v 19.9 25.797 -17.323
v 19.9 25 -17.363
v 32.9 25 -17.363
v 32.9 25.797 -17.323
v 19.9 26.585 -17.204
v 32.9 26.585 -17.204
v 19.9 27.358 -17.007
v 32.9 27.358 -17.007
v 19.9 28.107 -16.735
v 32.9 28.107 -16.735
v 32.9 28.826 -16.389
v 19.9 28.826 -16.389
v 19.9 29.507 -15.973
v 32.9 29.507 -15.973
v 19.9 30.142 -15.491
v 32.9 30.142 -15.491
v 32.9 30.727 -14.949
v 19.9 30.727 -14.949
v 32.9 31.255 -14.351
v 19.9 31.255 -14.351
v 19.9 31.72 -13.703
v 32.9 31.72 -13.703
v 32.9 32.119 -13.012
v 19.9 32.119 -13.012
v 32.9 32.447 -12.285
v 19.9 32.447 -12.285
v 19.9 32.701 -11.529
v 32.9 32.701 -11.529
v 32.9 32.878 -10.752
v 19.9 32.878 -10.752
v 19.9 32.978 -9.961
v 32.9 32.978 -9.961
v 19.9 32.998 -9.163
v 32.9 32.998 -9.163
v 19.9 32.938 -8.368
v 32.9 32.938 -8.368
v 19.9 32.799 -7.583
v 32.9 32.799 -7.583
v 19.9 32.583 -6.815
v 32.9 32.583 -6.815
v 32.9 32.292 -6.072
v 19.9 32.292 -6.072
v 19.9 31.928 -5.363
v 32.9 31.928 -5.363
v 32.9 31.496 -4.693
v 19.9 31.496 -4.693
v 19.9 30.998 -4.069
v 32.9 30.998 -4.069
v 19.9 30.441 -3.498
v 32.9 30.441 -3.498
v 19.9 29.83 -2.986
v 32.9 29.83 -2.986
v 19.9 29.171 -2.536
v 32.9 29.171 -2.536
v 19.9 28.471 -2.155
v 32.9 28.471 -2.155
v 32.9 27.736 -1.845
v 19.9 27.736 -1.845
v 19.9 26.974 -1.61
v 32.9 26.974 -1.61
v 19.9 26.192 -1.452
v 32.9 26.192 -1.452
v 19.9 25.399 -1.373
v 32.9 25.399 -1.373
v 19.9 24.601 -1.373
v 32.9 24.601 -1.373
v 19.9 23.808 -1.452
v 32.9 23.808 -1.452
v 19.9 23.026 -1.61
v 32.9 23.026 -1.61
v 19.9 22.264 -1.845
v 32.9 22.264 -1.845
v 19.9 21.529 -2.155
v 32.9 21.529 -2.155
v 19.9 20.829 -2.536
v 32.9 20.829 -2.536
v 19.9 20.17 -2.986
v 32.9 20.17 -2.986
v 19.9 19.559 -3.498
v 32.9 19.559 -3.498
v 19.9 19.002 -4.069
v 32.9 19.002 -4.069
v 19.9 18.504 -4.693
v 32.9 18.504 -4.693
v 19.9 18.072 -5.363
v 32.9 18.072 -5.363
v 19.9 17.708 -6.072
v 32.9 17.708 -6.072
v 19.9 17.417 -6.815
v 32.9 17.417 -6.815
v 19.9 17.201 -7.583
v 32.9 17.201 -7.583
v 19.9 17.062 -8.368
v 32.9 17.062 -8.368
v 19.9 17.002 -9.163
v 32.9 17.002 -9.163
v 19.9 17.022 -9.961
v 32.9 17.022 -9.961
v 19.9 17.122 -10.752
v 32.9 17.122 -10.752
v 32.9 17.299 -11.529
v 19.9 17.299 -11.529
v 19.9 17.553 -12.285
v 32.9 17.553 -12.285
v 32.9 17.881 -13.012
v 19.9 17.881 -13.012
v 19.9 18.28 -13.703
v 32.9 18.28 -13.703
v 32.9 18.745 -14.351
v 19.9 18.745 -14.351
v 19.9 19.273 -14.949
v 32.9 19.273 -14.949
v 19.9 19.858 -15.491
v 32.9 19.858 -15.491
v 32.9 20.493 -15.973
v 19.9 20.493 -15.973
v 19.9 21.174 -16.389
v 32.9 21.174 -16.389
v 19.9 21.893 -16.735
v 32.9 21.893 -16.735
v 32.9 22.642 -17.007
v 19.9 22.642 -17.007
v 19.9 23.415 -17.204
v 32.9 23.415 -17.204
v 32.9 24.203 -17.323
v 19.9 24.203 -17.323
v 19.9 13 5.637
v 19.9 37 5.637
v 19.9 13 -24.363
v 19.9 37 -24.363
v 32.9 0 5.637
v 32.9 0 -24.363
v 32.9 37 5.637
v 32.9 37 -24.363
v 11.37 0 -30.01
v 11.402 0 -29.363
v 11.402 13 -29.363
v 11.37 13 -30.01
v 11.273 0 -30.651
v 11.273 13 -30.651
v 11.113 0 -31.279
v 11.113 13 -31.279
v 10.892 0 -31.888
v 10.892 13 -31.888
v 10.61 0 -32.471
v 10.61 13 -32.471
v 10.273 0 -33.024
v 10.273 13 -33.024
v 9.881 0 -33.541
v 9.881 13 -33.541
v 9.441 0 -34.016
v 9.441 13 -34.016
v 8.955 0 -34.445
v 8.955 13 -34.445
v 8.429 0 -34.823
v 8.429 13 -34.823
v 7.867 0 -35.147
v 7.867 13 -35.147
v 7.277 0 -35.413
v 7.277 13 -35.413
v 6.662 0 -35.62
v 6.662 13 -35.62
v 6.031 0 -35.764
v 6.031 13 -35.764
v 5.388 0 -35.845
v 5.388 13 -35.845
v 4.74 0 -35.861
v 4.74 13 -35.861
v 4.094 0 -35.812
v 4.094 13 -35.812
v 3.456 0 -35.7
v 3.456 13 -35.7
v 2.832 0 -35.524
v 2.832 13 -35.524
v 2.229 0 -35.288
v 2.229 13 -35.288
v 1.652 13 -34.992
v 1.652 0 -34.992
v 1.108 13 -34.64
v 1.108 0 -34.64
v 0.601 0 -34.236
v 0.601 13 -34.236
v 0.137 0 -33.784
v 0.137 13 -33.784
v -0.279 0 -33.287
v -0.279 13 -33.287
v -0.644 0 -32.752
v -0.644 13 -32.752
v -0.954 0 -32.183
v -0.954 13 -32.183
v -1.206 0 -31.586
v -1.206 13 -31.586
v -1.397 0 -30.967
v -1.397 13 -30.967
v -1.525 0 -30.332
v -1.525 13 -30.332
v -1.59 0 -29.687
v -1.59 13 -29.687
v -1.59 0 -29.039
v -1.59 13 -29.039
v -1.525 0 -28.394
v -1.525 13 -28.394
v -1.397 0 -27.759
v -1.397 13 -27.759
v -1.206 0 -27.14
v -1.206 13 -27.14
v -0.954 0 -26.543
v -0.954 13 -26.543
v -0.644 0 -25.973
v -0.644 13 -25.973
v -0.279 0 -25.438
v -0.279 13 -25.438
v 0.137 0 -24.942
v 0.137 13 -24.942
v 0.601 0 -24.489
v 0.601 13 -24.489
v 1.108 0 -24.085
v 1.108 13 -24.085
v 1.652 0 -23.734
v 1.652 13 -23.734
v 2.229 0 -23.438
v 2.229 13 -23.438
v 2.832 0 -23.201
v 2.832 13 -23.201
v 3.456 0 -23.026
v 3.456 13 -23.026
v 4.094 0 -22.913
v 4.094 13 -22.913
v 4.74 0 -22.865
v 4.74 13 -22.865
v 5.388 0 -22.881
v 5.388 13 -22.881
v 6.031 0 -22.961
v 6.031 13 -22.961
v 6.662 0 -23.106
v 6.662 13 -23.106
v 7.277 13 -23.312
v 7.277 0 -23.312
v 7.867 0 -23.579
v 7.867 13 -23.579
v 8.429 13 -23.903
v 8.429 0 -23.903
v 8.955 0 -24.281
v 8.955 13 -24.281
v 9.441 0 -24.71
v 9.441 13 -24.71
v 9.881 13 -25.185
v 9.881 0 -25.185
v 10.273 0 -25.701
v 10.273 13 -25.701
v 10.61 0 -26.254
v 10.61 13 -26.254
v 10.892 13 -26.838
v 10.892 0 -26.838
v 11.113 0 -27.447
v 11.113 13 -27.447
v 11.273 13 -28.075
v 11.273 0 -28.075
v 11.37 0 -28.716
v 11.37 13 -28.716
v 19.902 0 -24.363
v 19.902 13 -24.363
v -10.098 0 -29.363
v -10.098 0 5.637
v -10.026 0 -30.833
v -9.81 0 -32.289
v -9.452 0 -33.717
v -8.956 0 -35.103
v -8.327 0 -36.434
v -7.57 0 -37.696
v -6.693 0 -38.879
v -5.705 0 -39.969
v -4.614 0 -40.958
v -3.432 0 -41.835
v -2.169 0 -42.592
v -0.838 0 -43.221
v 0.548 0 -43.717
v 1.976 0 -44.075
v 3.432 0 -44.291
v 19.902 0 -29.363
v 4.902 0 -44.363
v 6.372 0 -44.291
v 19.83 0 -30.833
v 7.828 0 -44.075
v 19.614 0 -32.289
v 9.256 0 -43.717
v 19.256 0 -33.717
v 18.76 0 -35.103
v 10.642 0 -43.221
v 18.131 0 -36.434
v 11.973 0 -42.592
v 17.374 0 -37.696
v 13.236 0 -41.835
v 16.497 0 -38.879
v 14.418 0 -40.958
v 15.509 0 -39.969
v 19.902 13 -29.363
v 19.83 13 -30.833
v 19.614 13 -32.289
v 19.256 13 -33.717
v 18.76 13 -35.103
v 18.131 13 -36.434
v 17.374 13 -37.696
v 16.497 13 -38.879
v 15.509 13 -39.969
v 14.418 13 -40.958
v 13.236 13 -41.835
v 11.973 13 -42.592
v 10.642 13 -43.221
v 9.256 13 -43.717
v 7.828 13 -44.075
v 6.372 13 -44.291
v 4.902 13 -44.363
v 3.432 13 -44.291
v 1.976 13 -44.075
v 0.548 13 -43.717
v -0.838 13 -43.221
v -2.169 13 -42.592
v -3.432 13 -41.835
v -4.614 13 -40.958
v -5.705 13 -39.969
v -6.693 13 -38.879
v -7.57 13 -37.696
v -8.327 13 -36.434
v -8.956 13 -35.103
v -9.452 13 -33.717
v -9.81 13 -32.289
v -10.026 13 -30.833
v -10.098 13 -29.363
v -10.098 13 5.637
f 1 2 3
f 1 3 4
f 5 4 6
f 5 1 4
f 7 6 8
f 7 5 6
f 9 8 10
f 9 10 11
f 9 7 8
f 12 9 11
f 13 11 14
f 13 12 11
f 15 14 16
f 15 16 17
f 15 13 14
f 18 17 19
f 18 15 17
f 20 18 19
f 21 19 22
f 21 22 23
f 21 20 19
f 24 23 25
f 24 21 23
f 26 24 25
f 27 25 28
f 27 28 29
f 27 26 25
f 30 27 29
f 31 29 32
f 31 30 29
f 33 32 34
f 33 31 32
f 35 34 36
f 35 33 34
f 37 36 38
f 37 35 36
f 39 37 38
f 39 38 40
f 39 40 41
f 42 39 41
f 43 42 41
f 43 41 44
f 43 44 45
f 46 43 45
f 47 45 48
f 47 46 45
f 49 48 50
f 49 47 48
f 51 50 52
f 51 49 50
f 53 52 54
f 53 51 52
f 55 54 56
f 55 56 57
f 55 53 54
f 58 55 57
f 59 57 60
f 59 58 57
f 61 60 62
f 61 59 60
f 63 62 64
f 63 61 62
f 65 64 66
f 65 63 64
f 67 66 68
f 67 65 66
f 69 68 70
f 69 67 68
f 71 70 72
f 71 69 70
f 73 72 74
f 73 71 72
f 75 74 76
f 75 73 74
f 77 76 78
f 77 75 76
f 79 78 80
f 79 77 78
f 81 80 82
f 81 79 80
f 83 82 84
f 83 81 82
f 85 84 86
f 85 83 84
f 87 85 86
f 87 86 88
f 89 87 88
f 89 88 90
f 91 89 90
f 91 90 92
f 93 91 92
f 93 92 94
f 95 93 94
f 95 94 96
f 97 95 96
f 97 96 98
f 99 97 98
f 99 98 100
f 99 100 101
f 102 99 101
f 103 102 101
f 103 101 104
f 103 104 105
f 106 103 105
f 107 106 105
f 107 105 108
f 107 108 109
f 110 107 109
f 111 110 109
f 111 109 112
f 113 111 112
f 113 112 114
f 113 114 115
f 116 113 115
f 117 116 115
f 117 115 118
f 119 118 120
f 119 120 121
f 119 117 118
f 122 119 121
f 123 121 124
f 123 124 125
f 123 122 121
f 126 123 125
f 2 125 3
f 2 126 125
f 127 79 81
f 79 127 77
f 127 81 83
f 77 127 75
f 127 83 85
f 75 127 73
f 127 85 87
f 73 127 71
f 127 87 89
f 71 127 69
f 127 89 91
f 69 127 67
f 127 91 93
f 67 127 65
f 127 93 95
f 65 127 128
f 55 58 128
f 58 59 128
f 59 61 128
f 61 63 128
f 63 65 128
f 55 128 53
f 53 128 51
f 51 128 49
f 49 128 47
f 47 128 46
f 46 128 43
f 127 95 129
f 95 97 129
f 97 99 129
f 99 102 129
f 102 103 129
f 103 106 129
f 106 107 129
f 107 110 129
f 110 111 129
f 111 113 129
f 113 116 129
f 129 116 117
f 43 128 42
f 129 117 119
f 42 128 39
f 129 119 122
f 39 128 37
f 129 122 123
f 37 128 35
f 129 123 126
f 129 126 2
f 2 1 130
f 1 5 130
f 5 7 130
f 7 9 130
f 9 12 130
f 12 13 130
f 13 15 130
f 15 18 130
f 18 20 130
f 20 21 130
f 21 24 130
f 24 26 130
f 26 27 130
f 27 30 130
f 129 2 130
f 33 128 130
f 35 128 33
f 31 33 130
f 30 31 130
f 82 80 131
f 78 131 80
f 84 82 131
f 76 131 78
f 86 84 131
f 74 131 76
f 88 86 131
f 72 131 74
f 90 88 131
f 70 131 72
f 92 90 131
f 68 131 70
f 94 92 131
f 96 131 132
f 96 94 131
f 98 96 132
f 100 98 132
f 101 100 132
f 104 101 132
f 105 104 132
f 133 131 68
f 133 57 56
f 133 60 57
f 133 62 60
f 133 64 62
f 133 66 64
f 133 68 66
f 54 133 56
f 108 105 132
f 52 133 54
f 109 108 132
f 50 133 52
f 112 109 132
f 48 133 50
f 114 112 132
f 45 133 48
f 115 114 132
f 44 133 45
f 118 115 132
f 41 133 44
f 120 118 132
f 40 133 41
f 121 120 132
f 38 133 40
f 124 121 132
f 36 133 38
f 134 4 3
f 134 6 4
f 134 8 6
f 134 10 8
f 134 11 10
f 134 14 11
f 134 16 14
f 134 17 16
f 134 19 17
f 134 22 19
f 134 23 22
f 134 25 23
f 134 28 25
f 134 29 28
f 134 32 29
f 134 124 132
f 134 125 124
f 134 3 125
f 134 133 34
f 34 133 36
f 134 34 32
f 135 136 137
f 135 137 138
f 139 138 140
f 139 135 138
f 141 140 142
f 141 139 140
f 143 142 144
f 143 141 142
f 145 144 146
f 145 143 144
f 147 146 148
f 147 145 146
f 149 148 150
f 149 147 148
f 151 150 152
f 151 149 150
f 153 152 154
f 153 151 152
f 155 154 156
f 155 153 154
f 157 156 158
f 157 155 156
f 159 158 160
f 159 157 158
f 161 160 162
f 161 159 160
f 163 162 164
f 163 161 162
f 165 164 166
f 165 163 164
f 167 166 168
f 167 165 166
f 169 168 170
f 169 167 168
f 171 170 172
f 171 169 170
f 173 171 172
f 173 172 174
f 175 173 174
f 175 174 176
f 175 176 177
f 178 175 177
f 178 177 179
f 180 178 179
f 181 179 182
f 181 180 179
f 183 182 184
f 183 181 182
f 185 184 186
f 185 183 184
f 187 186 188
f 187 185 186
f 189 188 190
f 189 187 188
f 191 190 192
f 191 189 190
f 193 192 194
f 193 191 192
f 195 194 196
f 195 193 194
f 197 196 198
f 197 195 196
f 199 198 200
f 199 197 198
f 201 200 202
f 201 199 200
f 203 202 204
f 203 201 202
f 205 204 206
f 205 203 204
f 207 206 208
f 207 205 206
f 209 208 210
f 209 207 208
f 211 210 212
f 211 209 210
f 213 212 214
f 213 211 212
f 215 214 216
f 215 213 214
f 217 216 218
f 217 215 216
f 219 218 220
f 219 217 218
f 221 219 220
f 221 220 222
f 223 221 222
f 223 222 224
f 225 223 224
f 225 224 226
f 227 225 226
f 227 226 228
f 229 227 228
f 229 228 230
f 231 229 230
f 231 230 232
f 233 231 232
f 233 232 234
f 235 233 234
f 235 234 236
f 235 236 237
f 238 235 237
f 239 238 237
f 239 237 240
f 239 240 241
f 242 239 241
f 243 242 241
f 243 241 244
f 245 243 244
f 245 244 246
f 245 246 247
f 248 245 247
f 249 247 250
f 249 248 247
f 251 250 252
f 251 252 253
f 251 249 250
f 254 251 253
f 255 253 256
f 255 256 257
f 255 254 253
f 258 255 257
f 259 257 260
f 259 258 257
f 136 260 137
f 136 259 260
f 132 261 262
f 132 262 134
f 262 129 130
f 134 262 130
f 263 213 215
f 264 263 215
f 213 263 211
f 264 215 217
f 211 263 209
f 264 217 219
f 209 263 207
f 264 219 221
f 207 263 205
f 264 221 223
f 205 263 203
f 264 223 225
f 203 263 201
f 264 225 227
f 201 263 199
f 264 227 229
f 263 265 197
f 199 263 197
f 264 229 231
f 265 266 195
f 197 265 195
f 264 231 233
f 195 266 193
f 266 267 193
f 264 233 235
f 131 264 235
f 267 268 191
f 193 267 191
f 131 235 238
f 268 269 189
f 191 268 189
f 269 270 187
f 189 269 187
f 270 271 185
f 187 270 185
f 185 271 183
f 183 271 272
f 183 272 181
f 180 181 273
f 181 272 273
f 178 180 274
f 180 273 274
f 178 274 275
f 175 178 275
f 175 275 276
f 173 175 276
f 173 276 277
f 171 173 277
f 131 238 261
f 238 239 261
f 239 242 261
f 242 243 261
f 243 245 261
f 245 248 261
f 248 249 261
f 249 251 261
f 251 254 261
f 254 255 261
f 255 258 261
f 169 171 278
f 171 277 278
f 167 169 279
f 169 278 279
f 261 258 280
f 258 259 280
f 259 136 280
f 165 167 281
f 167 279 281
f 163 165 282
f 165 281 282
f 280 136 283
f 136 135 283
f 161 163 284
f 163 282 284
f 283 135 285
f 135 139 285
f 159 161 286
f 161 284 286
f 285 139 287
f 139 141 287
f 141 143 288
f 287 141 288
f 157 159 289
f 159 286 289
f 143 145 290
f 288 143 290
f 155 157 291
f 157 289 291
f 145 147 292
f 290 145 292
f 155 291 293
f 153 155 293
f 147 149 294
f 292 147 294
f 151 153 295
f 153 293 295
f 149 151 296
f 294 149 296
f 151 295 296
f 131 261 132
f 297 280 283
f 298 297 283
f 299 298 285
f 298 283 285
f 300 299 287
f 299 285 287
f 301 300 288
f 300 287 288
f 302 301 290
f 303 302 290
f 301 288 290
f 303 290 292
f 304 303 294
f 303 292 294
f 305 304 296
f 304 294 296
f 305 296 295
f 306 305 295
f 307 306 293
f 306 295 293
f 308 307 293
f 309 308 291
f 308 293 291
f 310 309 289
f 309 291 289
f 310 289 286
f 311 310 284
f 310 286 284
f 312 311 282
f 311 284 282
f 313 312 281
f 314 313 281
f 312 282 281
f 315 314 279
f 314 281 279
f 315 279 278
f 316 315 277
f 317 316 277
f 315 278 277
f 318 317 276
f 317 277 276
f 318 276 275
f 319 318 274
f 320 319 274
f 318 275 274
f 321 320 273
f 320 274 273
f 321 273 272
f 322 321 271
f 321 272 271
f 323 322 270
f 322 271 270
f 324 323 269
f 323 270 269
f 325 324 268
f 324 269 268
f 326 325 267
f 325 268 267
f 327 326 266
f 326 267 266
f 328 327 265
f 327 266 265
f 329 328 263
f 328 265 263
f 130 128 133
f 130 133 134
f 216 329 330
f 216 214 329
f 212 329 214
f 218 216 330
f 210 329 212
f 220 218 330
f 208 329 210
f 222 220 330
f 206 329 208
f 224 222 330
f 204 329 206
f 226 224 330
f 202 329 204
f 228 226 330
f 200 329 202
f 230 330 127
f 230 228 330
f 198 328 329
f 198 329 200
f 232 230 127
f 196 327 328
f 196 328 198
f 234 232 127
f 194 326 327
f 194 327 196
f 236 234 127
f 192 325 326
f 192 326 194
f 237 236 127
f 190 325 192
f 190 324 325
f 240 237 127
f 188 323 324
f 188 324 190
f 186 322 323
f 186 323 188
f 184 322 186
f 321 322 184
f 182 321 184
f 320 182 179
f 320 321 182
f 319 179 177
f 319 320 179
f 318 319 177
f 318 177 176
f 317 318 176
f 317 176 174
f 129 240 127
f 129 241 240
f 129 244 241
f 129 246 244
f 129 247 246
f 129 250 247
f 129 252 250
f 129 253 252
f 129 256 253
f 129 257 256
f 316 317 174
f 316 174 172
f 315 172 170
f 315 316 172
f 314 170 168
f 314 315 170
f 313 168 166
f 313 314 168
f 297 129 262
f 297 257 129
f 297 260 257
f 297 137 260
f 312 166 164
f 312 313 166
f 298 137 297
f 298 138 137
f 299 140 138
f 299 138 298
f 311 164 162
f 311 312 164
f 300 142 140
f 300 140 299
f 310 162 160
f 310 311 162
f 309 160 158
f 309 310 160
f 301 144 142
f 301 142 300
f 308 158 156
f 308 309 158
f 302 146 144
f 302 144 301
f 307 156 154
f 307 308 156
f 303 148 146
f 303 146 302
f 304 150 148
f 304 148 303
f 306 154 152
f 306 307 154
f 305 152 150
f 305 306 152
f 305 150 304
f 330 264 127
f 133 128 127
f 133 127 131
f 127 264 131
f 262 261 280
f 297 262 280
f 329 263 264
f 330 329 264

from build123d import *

# Parameters (mm, degrees)
SKETCH1_R           = 6.5
BOSS_EXTRUDE1_DEPTH = 13
BOSS_EXTRUDE2_START = 19.9
SKETCH2_W           = 30
SKETCH2_H           = 37
SKETCH2_R           = 8
BOSS_EXTRUDE2_DEPTH = 13


with BuildPart() as part:
    # Sketch1 → Boss-Extrude1 (new body)
    with BuildSketch(Plane(origin=(0, 0, 0), x_dir=(1, 0, 0), z_dir=(0, 1, 0))):
        with BuildLine():
            Line((-10.098039216, -5.637254902), (19.901960784, -5.637254902))
            Line((19.901960784, -5.637254902), (19.901960784, 29.362745098))
            ThreePointArc((19.901960784, 29.362745098), (4.901960784, 44.362745098), (-10.098039216, 29.362745098))
            Line((-10.098039216, 29.362745098), (-10.098039216, -5.637254902))
        make_face()
        with Locations((4.901960784, 29.362745098)):
            Circle(SKETCH1_R, mode=Mode.SUBTRACT)
    extrude(amount=BOSS_EXTRUDE1_DEPTH)

    # Sketch2 → Boss-Extrude2 (add)
    with BuildSketch(Plane(origin=(0, 0, 0), x_dir=(0, 0, -1), z_dir=(1, 0, 0)).offset(BOSS_EXTRUDE2_START)):
        with Locations((9.362745098, 18.5)):
            Rectangle(SKETCH2_W, SKETCH2_H)
        with Locations((9.362745098, 25)):
            Circle(SKETCH2_R, mode=Mode.SUBTRACT)
    extrude(amount=BOSS_EXTRUDE2_DEPTH)


solid = part.part
